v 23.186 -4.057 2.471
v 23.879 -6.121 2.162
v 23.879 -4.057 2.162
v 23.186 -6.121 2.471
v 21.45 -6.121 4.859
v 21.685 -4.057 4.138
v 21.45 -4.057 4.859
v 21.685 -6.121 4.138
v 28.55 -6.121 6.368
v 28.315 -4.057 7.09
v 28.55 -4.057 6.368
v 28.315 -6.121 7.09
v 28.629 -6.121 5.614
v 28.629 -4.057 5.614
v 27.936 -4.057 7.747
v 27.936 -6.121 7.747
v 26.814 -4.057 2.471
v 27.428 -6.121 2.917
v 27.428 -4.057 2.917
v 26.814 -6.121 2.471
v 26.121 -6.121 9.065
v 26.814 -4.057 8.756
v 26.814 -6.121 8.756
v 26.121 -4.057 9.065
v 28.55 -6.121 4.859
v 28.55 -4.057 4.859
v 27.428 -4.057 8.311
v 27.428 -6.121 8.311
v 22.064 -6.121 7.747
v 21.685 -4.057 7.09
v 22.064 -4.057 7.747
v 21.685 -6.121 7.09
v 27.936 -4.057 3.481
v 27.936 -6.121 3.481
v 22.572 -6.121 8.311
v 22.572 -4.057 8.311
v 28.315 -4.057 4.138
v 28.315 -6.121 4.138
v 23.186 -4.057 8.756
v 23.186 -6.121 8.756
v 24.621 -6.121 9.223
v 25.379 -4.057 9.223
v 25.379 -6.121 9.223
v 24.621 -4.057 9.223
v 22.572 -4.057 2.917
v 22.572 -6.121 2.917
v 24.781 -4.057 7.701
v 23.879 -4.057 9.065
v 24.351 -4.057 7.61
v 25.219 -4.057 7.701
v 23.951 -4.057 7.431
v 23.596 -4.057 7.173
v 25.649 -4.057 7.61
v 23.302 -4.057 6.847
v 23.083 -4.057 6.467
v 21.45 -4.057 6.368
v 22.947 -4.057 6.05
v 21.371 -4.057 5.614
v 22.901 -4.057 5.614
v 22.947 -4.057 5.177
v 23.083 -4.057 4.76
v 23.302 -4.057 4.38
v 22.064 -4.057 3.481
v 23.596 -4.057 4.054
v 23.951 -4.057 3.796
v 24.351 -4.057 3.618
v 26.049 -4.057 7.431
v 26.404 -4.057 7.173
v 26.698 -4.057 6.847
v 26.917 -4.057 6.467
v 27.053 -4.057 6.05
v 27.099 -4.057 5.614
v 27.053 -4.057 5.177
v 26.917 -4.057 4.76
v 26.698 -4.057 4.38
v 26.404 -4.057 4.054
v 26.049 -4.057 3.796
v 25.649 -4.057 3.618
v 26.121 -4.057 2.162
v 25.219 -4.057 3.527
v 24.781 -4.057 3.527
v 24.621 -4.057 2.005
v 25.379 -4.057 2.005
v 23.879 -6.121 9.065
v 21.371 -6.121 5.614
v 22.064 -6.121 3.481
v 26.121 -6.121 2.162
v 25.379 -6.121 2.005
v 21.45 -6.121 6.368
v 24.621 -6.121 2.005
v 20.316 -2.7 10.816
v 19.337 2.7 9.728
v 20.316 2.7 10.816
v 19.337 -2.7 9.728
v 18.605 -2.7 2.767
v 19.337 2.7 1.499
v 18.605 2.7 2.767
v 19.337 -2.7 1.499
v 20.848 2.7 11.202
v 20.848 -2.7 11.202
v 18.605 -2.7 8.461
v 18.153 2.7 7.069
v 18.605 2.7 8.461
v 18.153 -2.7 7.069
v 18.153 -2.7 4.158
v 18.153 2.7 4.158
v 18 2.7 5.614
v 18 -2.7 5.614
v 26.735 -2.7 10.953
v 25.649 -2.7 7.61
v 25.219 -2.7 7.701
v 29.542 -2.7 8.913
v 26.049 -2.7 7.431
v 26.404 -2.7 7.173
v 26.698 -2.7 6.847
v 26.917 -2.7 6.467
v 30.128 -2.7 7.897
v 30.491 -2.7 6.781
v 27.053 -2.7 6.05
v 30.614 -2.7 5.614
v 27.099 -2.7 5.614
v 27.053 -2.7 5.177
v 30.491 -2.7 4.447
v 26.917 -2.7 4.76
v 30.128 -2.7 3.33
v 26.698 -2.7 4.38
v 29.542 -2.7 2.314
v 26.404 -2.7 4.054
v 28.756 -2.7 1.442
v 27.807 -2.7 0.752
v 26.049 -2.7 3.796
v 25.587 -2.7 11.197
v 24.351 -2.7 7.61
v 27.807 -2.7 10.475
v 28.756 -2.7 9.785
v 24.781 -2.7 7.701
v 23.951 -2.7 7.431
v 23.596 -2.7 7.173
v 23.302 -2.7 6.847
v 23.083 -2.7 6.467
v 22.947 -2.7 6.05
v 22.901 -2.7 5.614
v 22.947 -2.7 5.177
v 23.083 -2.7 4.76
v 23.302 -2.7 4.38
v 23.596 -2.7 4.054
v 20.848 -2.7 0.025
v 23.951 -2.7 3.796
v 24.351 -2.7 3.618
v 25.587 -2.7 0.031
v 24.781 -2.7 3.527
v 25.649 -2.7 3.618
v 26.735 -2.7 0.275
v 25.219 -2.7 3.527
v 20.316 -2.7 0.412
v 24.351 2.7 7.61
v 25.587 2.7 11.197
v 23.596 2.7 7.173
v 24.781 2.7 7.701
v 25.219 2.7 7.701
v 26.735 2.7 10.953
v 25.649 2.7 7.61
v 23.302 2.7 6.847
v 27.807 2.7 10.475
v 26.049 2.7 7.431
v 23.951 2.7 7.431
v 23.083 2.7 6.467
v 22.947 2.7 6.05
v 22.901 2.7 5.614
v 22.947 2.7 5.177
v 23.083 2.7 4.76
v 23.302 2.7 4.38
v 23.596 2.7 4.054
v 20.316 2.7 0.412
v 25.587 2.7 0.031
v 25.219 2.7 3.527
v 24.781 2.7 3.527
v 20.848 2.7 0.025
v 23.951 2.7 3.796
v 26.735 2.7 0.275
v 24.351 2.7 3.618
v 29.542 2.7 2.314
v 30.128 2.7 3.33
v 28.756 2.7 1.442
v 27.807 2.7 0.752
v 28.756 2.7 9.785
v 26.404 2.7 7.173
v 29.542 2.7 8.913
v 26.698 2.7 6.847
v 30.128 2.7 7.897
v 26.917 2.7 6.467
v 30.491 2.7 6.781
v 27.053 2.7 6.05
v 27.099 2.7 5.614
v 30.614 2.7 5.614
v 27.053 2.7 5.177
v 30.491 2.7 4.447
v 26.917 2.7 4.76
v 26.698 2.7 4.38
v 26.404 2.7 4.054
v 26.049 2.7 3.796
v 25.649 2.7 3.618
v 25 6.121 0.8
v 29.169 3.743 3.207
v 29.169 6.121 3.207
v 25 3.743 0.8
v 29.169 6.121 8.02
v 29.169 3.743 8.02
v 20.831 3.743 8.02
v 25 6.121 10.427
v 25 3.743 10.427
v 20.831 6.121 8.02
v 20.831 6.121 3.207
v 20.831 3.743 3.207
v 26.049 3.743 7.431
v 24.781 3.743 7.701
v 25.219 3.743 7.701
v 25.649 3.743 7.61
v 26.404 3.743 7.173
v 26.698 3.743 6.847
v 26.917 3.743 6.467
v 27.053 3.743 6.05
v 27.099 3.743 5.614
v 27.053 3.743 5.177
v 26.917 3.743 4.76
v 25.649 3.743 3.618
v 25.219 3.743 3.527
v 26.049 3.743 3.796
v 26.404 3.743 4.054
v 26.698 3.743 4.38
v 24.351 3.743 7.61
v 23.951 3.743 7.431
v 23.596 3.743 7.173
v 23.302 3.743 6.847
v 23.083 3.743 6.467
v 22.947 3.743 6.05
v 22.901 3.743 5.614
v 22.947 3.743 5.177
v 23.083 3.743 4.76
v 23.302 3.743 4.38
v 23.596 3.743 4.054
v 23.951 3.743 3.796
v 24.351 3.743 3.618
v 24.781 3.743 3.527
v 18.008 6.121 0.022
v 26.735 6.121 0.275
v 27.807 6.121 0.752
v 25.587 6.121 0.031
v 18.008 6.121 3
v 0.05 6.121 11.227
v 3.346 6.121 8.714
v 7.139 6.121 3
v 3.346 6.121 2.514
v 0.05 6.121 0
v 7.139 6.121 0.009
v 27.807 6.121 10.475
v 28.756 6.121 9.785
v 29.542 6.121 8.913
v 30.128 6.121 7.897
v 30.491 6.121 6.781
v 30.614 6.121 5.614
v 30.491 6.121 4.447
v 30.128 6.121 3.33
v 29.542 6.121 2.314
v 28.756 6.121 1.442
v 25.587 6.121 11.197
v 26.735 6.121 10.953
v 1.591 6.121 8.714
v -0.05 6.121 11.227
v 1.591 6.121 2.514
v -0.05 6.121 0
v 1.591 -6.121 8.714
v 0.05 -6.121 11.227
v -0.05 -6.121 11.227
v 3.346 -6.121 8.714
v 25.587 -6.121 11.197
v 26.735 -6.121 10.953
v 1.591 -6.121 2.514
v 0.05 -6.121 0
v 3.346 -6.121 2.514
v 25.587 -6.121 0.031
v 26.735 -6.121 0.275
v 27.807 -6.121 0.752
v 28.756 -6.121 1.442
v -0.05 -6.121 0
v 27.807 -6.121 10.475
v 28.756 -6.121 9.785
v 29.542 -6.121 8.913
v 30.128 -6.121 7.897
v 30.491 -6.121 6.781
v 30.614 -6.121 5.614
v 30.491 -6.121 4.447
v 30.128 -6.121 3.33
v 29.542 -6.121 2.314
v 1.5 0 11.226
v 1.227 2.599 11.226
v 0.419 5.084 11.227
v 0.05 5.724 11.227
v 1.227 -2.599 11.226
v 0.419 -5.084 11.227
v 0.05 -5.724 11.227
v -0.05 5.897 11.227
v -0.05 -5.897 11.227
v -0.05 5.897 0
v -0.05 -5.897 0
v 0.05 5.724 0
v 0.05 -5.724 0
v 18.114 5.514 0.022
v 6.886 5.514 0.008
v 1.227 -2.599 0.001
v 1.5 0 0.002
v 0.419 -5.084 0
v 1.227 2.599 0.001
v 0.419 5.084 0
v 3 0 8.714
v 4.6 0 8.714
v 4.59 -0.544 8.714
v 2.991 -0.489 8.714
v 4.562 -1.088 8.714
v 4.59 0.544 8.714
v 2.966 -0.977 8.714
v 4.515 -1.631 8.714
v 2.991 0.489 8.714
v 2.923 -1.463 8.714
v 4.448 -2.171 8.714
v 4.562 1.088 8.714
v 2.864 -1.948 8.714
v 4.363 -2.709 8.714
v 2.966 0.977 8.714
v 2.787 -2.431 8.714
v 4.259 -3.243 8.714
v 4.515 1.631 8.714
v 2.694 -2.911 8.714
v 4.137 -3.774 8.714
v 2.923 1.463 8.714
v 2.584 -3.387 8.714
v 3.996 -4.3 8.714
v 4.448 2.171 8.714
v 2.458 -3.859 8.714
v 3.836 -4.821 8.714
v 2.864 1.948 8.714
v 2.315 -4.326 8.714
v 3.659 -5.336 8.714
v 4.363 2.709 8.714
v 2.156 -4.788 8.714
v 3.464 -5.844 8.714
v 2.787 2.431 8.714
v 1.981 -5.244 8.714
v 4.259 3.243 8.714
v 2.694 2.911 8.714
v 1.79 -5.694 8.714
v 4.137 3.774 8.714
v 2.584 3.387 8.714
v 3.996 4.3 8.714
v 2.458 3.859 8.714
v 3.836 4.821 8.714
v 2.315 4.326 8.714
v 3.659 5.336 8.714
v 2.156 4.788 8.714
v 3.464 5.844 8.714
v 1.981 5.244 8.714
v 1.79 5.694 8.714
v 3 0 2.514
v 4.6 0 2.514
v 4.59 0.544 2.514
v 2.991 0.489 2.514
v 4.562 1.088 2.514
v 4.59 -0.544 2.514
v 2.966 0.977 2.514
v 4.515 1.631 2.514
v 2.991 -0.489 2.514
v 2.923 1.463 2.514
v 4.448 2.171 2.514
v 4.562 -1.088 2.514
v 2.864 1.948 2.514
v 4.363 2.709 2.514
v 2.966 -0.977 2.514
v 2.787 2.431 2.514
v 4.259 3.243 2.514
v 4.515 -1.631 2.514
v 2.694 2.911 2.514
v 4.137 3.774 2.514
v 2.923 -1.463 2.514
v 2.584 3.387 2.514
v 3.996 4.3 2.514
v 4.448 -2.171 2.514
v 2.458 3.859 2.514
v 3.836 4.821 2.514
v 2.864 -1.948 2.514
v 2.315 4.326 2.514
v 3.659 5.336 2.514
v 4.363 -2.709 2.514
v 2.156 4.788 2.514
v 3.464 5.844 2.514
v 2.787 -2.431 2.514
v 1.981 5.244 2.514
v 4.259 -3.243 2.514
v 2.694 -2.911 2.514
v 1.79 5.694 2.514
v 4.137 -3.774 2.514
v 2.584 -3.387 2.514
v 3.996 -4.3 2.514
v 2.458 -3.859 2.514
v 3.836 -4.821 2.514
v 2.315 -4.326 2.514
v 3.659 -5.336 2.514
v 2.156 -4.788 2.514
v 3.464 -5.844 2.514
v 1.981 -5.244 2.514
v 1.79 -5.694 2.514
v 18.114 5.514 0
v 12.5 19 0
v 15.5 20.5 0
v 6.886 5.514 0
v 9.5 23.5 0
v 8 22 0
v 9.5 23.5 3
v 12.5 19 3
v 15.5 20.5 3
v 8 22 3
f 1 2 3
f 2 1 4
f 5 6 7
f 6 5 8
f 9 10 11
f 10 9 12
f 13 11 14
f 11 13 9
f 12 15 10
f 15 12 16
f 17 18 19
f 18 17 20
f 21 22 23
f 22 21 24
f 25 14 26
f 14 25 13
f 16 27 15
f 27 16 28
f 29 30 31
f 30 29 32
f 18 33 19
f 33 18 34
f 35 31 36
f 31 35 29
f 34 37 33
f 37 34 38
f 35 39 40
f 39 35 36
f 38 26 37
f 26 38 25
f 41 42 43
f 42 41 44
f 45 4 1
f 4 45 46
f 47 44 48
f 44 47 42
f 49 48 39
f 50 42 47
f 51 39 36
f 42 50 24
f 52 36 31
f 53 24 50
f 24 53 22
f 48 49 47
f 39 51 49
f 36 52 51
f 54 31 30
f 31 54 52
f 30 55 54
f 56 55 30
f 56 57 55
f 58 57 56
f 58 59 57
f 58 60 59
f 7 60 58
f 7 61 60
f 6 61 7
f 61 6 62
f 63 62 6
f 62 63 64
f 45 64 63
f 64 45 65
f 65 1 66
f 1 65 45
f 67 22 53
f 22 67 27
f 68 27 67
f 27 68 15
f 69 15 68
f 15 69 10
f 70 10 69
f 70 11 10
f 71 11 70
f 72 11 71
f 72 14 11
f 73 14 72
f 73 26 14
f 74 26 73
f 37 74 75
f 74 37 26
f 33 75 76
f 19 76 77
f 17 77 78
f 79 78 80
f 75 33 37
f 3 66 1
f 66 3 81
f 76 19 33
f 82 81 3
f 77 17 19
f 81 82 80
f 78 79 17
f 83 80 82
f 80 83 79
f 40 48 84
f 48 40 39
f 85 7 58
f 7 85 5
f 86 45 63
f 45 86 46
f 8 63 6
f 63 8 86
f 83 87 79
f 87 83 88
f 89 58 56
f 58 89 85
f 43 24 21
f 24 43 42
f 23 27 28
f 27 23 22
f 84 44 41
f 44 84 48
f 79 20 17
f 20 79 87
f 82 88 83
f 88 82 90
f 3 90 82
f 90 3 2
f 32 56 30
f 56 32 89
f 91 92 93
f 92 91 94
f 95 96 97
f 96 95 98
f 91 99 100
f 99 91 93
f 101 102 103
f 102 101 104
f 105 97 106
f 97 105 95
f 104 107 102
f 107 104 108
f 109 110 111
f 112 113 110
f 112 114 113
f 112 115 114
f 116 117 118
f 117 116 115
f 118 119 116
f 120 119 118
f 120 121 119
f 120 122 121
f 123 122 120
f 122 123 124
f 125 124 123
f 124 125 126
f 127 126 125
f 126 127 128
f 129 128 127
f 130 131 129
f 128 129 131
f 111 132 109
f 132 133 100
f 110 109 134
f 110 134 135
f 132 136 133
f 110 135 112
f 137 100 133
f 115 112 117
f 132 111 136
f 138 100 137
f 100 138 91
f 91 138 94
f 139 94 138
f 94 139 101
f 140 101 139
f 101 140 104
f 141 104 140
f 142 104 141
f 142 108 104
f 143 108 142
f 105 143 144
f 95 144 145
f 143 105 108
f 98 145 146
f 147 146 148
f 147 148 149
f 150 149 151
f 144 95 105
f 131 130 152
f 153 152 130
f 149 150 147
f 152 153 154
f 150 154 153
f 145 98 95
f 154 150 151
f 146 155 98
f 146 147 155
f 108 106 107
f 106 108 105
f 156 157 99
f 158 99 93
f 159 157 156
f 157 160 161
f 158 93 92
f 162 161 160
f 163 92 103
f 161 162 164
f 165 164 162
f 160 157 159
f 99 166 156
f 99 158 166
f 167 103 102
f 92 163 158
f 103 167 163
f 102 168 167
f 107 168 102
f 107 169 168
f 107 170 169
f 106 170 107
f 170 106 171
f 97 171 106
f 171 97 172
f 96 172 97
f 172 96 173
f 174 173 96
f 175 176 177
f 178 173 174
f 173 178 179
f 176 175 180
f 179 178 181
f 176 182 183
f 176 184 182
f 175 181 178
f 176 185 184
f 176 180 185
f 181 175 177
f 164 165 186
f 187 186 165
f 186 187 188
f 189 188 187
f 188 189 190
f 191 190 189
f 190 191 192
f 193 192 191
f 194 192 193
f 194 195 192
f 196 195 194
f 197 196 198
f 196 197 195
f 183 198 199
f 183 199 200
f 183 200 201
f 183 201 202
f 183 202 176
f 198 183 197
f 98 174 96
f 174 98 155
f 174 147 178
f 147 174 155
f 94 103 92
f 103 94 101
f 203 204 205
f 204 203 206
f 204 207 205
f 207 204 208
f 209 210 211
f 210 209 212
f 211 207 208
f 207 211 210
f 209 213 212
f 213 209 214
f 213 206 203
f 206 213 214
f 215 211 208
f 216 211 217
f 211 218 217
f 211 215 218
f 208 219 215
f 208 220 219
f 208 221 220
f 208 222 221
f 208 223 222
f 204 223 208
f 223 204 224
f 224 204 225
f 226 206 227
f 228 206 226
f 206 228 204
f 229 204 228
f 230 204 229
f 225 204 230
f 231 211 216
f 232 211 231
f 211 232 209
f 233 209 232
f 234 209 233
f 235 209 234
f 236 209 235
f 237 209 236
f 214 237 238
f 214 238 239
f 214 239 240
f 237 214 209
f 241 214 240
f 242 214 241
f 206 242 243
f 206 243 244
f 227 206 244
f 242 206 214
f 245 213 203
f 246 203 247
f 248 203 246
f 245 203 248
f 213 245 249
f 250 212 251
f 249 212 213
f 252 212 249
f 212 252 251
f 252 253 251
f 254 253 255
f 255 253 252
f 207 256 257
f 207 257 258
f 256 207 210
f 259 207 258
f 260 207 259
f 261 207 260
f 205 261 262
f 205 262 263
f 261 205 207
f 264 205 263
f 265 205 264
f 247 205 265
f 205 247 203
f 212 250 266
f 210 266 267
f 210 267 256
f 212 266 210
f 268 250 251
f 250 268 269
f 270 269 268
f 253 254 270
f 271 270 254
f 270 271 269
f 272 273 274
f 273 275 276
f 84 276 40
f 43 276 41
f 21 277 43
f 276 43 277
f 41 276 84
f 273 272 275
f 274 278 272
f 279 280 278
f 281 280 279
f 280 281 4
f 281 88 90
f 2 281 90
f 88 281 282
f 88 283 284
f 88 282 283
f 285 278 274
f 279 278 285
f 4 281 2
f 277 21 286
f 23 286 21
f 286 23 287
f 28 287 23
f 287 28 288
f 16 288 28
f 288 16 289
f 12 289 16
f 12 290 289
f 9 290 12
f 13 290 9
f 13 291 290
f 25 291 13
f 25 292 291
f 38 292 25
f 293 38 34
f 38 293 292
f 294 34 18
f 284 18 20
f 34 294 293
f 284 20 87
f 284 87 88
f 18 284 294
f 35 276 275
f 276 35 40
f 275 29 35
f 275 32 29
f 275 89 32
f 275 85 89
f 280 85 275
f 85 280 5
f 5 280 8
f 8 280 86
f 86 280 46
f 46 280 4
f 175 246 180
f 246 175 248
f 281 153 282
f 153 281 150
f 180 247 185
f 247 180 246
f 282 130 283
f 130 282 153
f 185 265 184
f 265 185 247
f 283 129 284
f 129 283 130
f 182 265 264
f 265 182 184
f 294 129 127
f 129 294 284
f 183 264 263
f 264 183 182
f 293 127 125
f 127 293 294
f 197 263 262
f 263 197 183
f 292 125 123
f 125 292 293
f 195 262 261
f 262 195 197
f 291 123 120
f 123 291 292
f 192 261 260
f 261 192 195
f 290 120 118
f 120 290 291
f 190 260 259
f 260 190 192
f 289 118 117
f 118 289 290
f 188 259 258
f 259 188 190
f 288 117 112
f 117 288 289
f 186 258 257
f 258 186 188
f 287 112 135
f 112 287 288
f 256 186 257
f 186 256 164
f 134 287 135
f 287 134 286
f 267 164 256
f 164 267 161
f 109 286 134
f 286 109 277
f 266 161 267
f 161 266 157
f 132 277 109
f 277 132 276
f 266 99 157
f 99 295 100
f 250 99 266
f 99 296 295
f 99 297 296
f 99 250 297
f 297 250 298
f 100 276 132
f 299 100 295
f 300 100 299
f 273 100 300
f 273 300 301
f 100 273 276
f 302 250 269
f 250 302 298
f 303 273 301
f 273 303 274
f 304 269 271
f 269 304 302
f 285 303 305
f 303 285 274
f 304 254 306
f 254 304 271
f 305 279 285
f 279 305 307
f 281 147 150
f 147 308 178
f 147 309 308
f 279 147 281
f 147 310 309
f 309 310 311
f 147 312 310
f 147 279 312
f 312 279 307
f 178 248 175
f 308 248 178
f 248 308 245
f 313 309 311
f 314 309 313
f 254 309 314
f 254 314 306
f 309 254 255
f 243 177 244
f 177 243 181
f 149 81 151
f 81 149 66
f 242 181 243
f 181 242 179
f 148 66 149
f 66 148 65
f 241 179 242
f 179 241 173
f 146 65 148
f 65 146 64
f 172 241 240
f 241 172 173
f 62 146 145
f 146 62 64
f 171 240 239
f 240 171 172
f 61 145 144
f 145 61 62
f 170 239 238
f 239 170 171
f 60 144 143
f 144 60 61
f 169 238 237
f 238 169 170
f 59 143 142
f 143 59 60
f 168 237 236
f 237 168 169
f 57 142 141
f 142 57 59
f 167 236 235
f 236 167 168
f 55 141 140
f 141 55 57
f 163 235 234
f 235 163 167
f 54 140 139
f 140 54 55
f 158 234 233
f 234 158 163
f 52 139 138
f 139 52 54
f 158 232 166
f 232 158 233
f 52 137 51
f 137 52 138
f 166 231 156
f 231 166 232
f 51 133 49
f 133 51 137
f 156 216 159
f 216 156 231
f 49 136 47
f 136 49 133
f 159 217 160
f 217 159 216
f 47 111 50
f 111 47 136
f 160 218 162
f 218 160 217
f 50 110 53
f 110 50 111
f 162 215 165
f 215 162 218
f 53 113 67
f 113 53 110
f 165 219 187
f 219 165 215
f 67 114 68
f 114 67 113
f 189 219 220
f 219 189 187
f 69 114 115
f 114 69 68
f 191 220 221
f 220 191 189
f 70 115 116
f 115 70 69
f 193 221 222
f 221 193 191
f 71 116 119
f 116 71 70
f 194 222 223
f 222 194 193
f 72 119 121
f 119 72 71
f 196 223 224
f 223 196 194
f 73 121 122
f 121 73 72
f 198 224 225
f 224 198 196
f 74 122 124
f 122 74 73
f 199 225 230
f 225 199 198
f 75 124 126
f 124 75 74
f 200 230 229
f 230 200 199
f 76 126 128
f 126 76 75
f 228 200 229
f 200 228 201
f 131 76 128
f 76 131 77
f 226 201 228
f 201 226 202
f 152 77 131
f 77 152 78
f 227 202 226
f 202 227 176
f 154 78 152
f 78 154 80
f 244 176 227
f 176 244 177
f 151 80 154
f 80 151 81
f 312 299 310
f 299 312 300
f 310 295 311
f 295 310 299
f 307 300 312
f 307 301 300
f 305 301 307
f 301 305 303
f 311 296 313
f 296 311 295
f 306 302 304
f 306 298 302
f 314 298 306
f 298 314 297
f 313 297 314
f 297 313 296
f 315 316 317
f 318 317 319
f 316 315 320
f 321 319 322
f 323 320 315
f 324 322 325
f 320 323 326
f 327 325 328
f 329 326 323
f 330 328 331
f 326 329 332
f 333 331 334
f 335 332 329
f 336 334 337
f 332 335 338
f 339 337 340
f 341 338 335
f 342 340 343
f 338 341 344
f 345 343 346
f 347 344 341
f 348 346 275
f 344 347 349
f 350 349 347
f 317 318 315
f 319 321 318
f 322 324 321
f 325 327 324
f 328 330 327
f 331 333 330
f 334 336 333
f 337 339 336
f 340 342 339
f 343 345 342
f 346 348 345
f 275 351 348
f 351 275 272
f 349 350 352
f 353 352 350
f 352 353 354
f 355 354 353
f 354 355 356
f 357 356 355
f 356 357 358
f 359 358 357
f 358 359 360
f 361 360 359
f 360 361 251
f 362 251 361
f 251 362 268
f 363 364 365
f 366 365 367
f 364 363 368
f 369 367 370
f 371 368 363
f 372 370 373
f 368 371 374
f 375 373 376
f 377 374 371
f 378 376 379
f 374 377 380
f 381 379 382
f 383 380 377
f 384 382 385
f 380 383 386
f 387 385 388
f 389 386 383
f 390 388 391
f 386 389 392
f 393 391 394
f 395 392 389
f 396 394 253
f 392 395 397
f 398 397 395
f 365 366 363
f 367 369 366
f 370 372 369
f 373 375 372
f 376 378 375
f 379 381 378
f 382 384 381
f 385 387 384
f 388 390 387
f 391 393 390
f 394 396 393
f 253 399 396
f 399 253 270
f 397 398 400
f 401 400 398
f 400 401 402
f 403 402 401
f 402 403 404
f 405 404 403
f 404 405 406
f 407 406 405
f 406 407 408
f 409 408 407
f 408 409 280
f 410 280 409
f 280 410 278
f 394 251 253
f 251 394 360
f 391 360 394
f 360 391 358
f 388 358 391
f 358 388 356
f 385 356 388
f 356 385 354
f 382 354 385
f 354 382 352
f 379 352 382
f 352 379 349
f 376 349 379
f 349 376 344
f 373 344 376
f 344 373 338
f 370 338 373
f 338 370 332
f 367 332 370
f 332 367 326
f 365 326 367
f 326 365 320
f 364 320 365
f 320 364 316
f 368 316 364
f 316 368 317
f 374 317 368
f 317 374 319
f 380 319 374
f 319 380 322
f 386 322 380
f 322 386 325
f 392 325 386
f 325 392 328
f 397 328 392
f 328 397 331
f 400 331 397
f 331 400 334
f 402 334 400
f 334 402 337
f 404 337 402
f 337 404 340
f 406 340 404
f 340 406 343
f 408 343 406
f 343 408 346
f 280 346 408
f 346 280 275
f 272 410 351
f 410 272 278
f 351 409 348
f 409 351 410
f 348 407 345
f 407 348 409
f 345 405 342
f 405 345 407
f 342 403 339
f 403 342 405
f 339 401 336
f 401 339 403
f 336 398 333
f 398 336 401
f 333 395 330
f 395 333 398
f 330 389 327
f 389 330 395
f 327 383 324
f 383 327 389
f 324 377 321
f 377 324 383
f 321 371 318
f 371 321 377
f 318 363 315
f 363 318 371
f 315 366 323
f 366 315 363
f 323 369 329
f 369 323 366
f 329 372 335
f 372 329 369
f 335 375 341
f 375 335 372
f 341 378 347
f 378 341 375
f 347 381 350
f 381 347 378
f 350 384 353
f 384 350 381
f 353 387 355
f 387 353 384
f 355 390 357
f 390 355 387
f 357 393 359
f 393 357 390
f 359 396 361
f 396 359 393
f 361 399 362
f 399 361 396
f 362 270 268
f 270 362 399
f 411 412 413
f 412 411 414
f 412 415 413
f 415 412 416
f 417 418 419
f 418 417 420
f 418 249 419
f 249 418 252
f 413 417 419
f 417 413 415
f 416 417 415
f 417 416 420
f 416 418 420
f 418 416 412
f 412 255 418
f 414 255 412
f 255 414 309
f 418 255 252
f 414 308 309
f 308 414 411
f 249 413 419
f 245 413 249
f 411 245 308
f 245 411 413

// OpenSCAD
// Twitchy Cat Link
// Adrian McCarthy 2024-04-13
//
// Manually fabricating the necessary link for the Twitchy Cat Halloween
// prop was too error prone.  This design constrains some of the unwanted
// degrees of freedom and makes the mechanism work reliably.  It also
// gives a nearly ideal place to anchor the spring for the return action.

module twitchy_cat_link(l=25, th=3, nozzle_d=0.4) {
    no6_free_d = 0.1495 * 25.4 + nozzle_d;
    no6_head_d = 0.270 * 25.4 + nozzle_d;
    no6_head_h = 0.097 * 25.4 - nozzle_d;
    no6_nut_d = (5/16 * 25.4 + nozzle_d) / cos(30);
    no6_nut_h = 7/64 * 25.4 - nozzle_d;
    nose_w = 5;
    nose_d = 12;
    zip_w = 5 + 3*nozzle_d;
    zip_th = 2 + 3*nozzle_d;
    notch_w = nose_w + nozzle_d;
    notch_d = nose_d + 2;
    w    = max(th + notch_w + th, no6_head_h + 1.2 + notch_w + 1.2 + no6_nut_h);
    base = min(no6_nut_d + 4*nozzle_d, notch_d);
    translate([0, 0, base/2]) rotate([90, 0, 0]) {
        difference() {
            linear_extrude(w, convexity=8, center=true) {
                difference() {
                    hull() {
                        translate([l, 0]) circle(d=base, $fs=nozzle_d/2);
                        square([0.1, base], center=true);
                    }
                    translate([l, 0]) circle(d=no6_free_d, $fs=nozzle_d/2);
                }
            }
            translate([l, 0, 0]) {
                translate([0, 0, w/2-no6_head_h])
                    cylinder(h=no6_head_h+0.1, d=no6_head_d, $fs=nozzle_d/2);
                cylinder(h=notch_w, d=notch_d, center=true, $fs=nozzle_d/2);
                translate([0, 0, -(w/2+0.1)]) rotate([0, 0, 30])
                    cylinder(h=no6_nut_h+0.1, d=no6_nut_d, $fn=6);
            }
            translate([-(25-th)/2, 0, 0]) rotate([90, 0, 0])
                cylinder(h=base+0.1, d=25, center=true);
            translate([-(25-th)/2, 0, 0]) rotate([90, 0, 0]) {
                linear_extrude(zip_w, convexity=8, center=true) {
                    difference() {
                        // High $fn because the cable tie needs a smooth
                        // channel.
                        circle(d=25+th+zip_th, $fn=180);
                        circle(d=25+th, $fn=180);
                    }
                }
            }
        }
    }
    spring_d = 10;
    spring_offset = 30-22/2;
    wing_w = base;
    linear_extrude(th, convexity=8) {
        translate([l/2, 0, 0])
            polygon([
                [0, spring_offset],
                [-wing_w/2, base/2-0.1],
                [ wing_w/2, base/2-0.1],
                [ th, spring_offset+0.5*th],
                [-th, spring_offset+1.5*th],
                [-1.5*th, spring_offset+th]
            ]);
    }
}

twitchy_cat_link();
